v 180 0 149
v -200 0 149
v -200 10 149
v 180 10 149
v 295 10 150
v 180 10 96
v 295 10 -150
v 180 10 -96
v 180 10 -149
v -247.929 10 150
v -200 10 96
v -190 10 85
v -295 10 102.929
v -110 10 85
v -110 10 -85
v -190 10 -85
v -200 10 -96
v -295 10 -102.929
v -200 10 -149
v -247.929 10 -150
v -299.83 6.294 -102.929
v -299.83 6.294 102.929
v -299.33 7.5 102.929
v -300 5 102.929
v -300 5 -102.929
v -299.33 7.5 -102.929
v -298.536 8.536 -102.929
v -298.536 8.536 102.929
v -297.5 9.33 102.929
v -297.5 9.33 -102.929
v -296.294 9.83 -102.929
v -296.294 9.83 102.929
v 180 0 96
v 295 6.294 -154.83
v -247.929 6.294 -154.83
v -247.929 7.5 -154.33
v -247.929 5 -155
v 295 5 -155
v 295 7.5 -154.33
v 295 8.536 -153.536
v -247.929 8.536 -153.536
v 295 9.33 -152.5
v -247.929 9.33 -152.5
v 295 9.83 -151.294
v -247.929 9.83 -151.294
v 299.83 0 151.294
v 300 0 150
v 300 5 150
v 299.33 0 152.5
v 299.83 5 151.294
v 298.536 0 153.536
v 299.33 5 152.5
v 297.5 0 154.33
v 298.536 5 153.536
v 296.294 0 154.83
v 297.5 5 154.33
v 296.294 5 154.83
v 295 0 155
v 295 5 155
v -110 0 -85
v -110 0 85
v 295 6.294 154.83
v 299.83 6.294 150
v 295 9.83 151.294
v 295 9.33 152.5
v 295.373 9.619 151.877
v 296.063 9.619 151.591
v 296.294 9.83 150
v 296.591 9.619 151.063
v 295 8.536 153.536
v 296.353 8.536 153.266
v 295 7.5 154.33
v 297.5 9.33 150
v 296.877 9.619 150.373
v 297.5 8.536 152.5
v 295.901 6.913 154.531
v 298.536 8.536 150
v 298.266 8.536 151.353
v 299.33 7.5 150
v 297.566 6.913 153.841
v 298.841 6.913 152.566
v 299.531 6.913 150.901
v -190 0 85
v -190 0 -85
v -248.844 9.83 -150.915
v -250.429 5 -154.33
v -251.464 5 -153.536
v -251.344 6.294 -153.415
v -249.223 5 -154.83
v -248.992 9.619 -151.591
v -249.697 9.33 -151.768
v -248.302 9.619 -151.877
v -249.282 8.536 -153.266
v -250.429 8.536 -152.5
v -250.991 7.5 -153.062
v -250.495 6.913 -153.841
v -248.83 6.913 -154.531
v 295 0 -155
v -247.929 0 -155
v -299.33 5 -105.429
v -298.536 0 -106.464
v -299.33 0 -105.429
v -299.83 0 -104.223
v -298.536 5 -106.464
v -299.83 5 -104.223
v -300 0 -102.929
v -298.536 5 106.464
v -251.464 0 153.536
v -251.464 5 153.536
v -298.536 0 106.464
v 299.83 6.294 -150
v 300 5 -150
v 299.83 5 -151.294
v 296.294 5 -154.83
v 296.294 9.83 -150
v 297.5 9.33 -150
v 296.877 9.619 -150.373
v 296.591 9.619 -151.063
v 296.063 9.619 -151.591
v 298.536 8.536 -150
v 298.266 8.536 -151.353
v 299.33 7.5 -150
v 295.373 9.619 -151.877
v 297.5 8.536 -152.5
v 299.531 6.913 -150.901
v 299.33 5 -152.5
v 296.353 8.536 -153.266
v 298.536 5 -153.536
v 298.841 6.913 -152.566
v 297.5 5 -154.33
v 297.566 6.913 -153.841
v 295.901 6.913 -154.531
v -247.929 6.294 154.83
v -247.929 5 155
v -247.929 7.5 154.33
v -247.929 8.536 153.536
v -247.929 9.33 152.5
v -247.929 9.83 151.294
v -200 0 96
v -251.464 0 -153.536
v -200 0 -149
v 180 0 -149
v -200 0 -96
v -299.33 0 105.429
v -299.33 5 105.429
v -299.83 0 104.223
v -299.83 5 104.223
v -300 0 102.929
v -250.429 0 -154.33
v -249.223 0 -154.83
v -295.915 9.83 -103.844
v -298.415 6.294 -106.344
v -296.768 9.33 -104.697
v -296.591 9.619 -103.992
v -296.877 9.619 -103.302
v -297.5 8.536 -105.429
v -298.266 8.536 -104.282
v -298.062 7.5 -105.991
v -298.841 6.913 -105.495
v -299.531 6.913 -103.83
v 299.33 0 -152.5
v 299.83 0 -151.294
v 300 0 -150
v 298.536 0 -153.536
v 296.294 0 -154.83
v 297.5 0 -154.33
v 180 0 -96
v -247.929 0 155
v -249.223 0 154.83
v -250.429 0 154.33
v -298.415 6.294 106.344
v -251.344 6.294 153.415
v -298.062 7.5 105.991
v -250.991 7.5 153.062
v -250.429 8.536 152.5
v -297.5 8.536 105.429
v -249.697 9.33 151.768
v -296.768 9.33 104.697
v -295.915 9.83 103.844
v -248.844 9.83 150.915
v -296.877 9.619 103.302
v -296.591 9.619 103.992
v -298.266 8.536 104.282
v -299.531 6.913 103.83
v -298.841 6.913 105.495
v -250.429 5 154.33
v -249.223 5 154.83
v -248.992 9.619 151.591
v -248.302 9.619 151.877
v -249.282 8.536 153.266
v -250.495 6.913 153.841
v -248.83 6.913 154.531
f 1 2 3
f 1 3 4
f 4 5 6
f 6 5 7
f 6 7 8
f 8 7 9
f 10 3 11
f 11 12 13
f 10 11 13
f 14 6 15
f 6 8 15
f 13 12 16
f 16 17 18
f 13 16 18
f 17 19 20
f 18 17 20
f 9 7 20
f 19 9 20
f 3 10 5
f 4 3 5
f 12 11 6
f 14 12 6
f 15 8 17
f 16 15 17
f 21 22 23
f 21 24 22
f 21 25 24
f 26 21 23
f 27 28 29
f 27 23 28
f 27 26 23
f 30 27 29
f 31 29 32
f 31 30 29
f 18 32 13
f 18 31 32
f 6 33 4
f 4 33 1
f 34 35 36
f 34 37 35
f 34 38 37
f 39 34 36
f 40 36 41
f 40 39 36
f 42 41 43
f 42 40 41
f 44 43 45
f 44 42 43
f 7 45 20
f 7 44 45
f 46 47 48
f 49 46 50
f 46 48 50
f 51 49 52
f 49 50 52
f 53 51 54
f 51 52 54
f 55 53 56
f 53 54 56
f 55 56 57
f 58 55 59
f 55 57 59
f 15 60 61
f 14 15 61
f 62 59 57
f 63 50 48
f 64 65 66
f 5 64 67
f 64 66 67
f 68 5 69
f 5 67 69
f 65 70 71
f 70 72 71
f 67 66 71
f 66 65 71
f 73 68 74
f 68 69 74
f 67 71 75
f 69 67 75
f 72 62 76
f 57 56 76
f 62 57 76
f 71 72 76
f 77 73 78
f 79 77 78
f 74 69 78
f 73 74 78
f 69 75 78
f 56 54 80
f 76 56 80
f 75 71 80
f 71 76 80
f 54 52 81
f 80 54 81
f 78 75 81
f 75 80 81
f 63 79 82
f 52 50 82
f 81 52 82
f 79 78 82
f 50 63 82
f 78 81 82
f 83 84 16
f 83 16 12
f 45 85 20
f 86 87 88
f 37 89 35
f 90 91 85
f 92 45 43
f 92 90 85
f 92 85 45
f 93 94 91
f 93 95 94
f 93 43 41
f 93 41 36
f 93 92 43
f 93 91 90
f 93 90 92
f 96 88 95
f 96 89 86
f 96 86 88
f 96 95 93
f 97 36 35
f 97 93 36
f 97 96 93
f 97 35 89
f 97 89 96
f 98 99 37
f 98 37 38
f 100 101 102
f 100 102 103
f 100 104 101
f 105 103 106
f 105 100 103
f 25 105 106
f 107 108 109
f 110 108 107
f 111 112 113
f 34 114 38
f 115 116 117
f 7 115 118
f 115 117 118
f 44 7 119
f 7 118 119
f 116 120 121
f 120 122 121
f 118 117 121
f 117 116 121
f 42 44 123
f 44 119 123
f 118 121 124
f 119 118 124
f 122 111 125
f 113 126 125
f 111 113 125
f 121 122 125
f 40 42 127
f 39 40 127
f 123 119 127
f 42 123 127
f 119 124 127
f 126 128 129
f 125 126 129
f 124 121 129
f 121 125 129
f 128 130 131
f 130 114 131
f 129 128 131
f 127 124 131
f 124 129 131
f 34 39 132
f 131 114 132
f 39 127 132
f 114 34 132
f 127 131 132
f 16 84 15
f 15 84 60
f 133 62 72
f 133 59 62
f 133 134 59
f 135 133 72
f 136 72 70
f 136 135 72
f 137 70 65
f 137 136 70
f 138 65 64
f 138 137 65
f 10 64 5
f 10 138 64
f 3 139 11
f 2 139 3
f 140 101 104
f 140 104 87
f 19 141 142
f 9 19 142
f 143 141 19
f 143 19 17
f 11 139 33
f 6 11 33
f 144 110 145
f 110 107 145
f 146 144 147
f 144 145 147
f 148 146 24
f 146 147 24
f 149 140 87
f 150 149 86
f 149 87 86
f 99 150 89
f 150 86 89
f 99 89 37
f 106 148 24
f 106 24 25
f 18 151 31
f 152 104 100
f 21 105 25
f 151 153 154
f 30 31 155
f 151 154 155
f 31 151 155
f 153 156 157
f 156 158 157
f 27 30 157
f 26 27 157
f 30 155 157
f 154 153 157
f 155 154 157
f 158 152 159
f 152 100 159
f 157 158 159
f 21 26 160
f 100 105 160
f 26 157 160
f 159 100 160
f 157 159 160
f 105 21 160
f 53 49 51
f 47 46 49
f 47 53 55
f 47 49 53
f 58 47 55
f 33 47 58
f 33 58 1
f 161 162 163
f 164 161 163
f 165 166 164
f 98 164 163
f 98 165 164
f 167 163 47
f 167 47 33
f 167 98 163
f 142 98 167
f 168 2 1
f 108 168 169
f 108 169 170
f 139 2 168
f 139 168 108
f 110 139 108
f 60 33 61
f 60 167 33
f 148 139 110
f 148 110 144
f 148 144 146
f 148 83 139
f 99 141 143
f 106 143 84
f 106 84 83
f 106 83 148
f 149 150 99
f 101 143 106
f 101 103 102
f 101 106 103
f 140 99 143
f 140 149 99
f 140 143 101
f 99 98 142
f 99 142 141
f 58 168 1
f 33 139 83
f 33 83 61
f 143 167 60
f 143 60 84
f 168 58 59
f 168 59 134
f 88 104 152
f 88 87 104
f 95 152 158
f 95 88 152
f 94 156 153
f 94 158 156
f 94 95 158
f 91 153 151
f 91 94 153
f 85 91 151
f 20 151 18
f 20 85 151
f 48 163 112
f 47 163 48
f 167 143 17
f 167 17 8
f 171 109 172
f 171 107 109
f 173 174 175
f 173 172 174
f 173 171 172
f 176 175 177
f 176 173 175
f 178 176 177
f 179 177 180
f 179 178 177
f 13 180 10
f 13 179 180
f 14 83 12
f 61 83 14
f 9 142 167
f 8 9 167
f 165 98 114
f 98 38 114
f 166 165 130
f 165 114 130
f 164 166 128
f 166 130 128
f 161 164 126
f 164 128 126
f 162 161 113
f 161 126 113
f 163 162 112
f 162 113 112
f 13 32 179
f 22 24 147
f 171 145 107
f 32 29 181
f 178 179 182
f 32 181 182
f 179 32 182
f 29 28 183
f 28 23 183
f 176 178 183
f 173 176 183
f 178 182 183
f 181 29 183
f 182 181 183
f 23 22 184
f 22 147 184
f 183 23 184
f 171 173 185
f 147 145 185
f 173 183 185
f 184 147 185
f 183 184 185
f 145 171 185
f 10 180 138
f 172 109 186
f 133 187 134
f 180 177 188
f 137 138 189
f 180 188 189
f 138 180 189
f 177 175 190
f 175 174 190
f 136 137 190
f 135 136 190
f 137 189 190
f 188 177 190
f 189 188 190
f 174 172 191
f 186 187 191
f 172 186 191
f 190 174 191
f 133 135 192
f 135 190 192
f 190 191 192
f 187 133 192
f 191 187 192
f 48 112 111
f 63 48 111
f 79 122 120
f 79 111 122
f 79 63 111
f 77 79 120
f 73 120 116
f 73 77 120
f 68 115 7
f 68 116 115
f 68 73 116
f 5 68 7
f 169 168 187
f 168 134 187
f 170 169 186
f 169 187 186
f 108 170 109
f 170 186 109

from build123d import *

# Parameters (mm, degrees)
BOSS_EXTRUDE2_DEPTH = 10
FILLET1_R           = 5
SKETCH7_W           = 380
SKETCH7_H           = 53
SKETCH7_W_2         = 80
SKETCH7_H_2         = 170
CUT_EXTRUDE1_DEPTH  = 10


with BuildPart() as part:
    # Sketch1 → Boss-Extrude2 (new body)
    with BuildSketch(Plane(origin=(0, 0, 0), x_dir=(1, 0, 0), z_dir=(0, 1, 0))):
        Polygon((-300, 105), (-250, 155), (300, 155), (300, -155), (-250, -155), (-300, -105), align=None)
    extrude(amount=BOSS_EXTRUDE2_DEPTH)

    # Fillet1
    fillet1_edges = [part.edges().sort_by_distance(p)[0] for p in [
        (300, 5, 155),
        (-250, 5, 155),
        (-300, 5, 105),
        (-300, 5, -105),
        (-250, 5, -155),
        (300, 5, -155),
        (-275, 10, -130),
        (-300, 10, 0),
        (-275, 10, 130),
        (25, 10, 155),
        (300, 10, 0),
        (25, 10, -155),
    ]]
    fillet(fillet1_edges, radius=FILLET1_R)

    # Sketch7 → Cut-Extrude1 (cut)
    with BuildSketch(Plane.XZ):
        with Locations((-10, -122.5)):
            Rectangle(SKETCH7_W, SKETCH7_H)
        with Locations((-10, 122.5)):
            Rectangle(SKETCH7_W, SKETCH7_H)
        with Locations((-150, 0)):
            Rectangle(SKETCH7_W_2, SKETCH7_H_2)
    extrude(amount=-CUT_EXTRUDE1_DEPTH, mode=Mode.SUBTRACT)


solid = part.part
